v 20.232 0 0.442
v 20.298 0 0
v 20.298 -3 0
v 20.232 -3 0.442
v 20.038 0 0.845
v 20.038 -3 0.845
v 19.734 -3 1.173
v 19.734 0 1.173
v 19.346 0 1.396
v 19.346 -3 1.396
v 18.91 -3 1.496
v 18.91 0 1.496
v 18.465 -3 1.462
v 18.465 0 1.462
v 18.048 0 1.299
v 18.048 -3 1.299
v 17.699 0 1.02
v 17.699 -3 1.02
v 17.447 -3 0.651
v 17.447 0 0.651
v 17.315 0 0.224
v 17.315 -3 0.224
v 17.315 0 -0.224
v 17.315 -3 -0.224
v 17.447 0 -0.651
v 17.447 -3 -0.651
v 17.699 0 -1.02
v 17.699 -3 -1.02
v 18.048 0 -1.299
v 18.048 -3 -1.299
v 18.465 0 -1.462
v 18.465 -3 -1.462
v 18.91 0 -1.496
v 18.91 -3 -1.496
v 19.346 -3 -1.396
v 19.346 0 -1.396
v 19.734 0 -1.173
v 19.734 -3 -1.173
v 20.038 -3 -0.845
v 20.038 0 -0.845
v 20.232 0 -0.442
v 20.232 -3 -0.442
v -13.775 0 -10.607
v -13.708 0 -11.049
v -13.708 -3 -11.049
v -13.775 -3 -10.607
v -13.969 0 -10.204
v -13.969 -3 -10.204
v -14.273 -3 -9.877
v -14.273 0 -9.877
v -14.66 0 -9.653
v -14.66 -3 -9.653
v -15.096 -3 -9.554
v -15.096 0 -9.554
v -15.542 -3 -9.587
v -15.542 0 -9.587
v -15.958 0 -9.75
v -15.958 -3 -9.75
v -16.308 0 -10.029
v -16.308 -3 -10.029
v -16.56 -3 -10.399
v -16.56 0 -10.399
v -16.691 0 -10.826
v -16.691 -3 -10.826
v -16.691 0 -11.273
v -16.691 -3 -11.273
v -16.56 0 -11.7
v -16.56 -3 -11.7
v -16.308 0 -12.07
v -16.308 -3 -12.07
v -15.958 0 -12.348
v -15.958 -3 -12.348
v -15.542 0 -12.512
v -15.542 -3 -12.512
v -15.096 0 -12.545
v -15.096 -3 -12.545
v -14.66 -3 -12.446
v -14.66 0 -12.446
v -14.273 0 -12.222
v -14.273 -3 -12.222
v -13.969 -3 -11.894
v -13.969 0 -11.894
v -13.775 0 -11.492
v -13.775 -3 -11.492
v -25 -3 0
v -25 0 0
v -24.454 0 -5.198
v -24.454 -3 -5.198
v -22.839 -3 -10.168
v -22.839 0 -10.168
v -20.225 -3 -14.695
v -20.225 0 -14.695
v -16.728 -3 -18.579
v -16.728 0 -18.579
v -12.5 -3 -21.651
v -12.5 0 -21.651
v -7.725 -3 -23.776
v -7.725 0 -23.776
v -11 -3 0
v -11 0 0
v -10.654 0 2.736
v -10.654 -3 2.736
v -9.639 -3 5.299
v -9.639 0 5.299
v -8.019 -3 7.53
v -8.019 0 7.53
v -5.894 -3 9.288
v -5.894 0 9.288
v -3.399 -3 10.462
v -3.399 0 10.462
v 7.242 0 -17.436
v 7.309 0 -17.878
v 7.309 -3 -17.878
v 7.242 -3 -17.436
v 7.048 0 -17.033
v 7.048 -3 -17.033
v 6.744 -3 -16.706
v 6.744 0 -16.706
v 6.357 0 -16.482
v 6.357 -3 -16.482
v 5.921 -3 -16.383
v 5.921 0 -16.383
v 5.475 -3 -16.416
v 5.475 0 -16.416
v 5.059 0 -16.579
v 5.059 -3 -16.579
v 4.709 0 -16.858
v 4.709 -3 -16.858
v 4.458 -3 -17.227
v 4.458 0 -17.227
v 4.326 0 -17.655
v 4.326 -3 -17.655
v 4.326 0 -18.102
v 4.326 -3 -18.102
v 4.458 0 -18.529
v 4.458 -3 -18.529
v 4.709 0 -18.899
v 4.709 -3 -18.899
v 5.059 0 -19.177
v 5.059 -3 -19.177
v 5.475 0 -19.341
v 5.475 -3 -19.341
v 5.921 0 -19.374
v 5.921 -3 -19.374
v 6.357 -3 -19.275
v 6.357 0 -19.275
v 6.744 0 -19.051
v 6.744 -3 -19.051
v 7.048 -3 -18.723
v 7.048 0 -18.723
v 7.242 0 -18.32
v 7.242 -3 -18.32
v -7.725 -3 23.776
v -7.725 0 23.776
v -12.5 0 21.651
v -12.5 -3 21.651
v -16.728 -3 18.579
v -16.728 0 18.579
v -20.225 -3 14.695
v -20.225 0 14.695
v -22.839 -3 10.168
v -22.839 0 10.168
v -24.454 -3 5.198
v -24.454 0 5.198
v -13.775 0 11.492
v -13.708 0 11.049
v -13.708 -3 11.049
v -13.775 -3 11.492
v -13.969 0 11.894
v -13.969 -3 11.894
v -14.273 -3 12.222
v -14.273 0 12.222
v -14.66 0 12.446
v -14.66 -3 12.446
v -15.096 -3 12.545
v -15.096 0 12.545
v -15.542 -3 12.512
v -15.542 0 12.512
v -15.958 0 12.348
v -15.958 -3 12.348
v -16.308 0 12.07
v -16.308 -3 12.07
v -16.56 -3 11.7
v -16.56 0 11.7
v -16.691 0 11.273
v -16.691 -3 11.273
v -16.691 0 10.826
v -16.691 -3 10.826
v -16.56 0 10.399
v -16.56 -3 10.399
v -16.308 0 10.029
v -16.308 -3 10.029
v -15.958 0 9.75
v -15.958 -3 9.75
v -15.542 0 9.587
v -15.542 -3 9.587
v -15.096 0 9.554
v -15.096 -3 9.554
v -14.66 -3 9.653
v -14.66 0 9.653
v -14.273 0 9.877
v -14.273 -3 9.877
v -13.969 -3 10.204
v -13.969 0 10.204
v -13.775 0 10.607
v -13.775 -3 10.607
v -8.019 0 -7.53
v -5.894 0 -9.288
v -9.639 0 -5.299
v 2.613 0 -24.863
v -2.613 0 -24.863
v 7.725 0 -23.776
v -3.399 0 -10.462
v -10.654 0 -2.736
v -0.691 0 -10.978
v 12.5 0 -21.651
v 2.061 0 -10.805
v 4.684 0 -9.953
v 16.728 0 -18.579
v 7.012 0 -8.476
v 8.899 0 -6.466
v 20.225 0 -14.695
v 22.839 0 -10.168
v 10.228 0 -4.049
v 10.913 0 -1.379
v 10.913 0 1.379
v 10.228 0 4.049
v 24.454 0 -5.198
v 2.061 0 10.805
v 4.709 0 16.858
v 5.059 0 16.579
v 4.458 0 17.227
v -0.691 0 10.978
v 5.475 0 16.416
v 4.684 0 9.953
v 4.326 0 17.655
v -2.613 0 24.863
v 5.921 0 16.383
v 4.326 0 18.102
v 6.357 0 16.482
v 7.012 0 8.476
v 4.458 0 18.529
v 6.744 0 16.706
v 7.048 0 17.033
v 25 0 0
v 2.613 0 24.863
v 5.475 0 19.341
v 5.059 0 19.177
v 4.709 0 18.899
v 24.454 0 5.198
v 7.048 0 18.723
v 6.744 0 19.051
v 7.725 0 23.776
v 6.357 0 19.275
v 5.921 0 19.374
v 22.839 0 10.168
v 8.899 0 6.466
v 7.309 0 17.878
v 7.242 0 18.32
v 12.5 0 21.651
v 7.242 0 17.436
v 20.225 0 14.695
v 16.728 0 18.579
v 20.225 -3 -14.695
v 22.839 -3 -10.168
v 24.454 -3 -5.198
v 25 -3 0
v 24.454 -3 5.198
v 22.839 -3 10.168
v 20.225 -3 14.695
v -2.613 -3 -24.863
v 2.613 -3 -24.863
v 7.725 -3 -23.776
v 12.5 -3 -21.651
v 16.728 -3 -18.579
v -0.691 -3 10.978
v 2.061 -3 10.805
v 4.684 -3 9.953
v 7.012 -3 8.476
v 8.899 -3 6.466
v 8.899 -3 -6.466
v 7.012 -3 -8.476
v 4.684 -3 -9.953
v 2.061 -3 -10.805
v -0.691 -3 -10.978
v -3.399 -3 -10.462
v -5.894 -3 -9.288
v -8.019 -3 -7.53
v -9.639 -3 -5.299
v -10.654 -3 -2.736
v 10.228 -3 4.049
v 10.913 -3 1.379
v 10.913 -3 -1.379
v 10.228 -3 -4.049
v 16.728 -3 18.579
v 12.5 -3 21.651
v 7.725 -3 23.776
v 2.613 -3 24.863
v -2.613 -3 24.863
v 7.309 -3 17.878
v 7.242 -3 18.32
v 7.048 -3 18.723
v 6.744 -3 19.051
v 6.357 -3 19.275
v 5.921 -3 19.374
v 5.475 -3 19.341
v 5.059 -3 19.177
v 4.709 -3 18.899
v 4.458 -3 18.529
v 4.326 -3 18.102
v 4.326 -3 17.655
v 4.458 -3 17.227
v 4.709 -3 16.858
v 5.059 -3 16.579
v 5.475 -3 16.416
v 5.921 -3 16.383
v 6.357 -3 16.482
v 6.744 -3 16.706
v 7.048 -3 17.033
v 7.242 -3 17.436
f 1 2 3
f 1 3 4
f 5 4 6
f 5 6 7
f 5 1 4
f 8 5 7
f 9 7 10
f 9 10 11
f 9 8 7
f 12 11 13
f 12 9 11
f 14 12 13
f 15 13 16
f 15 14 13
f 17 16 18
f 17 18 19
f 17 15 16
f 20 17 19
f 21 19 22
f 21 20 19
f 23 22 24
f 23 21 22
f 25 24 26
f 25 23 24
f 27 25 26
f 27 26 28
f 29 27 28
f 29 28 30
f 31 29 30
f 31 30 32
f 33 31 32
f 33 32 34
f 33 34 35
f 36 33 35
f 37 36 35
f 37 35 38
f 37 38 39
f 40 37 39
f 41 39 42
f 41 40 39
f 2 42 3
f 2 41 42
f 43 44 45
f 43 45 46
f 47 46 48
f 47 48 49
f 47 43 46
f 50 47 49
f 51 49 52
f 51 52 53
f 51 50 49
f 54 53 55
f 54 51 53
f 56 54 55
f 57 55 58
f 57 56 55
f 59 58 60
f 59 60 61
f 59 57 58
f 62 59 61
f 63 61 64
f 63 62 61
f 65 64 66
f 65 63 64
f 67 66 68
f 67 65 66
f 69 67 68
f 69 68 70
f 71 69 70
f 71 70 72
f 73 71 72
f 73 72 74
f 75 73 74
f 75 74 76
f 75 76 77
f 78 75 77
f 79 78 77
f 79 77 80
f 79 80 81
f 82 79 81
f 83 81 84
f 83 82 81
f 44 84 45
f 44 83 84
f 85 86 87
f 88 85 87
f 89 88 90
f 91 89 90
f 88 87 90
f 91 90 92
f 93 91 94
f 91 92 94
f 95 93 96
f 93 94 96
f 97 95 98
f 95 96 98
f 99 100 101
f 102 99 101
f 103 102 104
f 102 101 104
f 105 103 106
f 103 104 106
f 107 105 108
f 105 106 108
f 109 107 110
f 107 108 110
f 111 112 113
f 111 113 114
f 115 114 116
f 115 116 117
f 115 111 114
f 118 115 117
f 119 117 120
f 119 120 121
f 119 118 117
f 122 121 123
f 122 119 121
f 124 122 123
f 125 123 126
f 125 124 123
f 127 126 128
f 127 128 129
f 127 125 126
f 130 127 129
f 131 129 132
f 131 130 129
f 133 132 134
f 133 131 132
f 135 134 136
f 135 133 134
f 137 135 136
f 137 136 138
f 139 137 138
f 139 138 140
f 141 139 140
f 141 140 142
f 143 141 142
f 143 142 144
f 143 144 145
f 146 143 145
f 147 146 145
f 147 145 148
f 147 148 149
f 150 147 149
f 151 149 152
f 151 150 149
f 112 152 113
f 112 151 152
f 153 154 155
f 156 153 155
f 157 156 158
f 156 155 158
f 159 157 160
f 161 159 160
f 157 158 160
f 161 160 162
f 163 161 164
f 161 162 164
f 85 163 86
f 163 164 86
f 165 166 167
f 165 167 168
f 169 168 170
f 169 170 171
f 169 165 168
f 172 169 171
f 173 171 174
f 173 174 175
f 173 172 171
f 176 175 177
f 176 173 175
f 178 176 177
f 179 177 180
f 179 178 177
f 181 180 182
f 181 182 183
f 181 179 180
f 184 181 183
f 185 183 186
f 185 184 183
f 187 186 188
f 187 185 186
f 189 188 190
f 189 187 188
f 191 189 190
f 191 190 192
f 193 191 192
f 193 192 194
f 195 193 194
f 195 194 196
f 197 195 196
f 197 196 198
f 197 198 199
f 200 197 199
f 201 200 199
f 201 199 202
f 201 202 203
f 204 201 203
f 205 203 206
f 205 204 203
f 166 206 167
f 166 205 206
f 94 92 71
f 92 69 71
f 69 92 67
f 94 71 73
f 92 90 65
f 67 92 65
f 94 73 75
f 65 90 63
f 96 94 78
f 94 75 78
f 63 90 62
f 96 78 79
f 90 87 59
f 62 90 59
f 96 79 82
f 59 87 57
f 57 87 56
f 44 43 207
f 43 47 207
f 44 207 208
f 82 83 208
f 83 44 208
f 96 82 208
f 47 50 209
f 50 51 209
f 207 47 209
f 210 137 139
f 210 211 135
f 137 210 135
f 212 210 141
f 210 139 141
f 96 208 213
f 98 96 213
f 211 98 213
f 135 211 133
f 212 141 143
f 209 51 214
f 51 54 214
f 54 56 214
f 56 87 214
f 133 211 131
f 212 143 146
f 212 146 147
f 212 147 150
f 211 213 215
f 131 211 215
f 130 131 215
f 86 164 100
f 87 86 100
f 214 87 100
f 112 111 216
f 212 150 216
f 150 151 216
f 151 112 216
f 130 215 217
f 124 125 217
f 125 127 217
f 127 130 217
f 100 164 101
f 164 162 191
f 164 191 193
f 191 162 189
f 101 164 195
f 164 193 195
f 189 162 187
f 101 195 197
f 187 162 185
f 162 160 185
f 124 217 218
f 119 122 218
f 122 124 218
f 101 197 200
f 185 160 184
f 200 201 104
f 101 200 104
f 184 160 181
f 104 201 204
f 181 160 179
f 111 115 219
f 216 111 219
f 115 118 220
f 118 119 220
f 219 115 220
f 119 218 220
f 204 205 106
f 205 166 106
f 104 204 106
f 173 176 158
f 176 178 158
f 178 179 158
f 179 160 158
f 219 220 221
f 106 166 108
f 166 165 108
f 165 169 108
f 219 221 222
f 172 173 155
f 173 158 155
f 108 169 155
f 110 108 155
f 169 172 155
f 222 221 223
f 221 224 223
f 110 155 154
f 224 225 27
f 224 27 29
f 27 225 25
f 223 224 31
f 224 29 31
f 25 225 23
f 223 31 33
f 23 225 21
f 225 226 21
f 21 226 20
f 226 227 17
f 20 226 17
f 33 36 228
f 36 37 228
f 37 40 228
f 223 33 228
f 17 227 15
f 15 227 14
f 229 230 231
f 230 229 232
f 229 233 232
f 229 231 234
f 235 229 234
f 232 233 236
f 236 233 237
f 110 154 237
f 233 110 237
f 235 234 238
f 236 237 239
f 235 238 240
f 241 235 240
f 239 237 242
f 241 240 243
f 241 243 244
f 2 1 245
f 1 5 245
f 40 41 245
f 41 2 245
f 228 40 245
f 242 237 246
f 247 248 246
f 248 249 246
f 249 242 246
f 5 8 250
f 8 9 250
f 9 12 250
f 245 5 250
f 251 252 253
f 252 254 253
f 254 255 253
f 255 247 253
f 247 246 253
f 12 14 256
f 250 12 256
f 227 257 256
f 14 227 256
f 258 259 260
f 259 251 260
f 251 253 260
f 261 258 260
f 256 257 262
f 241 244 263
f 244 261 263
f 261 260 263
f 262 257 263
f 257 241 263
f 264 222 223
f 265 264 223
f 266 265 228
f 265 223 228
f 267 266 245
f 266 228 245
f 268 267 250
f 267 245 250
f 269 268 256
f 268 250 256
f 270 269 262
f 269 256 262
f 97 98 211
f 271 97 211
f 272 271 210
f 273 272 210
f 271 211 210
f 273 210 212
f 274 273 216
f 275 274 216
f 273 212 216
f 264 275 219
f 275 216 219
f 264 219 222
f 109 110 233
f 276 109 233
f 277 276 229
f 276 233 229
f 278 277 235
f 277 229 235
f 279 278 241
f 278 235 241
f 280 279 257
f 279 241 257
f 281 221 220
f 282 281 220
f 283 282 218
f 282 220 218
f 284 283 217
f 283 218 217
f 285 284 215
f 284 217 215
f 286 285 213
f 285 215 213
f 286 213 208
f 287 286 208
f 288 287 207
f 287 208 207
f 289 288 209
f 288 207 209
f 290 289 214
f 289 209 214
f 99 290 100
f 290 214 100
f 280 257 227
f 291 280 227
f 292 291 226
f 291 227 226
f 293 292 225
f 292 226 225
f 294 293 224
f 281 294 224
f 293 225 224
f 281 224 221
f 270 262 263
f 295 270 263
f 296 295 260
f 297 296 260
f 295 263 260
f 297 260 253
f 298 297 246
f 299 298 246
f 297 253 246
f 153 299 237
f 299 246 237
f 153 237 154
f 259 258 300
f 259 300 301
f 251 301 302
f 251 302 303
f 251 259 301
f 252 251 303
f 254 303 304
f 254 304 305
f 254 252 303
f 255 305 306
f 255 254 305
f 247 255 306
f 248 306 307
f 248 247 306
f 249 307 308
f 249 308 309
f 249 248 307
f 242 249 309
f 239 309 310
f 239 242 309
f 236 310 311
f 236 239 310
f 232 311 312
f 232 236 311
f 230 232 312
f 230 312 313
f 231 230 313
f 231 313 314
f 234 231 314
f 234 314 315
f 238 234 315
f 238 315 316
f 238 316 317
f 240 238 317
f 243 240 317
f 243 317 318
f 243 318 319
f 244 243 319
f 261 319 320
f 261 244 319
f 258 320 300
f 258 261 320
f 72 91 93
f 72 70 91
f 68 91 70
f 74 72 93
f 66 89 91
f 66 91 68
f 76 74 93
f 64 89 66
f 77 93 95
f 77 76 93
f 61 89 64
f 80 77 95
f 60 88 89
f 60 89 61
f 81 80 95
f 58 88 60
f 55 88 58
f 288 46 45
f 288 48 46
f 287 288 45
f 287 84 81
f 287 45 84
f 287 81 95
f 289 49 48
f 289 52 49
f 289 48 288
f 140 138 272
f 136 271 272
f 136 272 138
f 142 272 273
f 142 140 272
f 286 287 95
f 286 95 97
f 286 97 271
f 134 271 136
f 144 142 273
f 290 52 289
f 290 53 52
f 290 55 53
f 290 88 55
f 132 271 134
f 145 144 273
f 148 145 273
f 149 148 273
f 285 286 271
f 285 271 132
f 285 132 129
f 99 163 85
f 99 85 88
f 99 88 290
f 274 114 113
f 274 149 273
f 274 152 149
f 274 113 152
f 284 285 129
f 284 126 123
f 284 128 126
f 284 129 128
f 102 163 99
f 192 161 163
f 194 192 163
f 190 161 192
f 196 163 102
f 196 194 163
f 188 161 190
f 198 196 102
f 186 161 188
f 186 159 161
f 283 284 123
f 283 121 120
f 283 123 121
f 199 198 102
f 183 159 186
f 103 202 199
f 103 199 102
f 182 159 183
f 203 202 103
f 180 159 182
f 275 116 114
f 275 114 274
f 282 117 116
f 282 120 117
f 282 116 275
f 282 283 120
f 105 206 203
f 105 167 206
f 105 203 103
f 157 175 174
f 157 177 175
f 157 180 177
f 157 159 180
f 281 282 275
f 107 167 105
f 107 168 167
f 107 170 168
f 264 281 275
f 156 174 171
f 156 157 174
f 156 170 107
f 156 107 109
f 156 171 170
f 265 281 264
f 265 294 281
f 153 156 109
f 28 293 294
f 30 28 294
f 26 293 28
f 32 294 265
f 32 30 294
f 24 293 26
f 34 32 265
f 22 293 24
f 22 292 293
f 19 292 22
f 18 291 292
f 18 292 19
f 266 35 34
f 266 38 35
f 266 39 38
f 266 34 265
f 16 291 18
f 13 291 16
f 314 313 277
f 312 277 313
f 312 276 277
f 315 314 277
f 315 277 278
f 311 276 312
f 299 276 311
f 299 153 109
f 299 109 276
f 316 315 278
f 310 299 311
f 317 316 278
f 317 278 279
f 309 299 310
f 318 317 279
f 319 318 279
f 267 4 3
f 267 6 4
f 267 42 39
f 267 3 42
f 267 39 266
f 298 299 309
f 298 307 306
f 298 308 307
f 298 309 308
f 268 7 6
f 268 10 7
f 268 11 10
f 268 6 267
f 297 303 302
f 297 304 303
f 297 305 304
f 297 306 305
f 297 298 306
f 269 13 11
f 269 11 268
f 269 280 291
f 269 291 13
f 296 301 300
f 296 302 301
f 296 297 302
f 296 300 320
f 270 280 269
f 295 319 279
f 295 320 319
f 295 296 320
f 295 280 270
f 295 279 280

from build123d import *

# Parameters (mm, degrees)
F0_R     = 1.5
F1_DEPTH = 3


with BuildPart() as f1:
    # F0 (on Front) → F1 (new body)
    with BuildSketch(Plane.XZ):
        with BuildLine():
            ThreePointArc((20.225425, 14.694631), (7.725425, 23.776413), (-7.725425, 23.776413))
            ThreePointArc((-7.725425, 23.776413), (-20.225425, 14.694631), (-25, 0))
            ThreePointArc((-25, 0), (-20.225425, -14.694631), (-7.725425, -23.776413))
            ThreePointArc((-7.725425, -23.776413), (7.725425, -23.776413), (20.225425, -14.694631))
            ThreePointArc((20.225425, -14.694631), (25, 0), (20.225425, 14.694631))
        make_face()
        with Locations((-15.20821, -11.049411)):
            Circle(F0_R, mode=Mode.SUBTRACT)
        with Locations((5.809019, -17.878323)):
            Circle(F0_R, mode=Mode.SUBTRACT)
        with Locations((-15.20821, 11.049411)):
            Circle(F0_R, mode=Mode.SUBTRACT)
        with BuildLine():
            ThreePointArc((-11, 0), (-8.899187, 6.465638), (-3.399187, 10.461622))
            ThreePointArc((-3.399187, 10.461622), (3.399187, 10.461622), (8.899187, 6.465638))
            ThreePointArc((8.899187, 6.465638), (11, 0), (8.899187, -6.465638))
            ThreePointArc((8.899187, -6.465638), (3.399187, -10.461622), (-3.399187, -10.461622))
            ThreePointArc((-3.399187, -10.461622), (-8.899187, -6.465638), (-11, 0))
        make_face(mode=Mode.SUBTRACT)
        with Locations((18.798381, 0)):
            Circle(F0_R, mode=Mode.SUBTRACT)
        with Locations((5.809019, 17.878323)):
            Circle(F0_R, mode=Mode.SUBTRACT)
    extrude(amount=F1_DEPTH)


solid = f1.part
